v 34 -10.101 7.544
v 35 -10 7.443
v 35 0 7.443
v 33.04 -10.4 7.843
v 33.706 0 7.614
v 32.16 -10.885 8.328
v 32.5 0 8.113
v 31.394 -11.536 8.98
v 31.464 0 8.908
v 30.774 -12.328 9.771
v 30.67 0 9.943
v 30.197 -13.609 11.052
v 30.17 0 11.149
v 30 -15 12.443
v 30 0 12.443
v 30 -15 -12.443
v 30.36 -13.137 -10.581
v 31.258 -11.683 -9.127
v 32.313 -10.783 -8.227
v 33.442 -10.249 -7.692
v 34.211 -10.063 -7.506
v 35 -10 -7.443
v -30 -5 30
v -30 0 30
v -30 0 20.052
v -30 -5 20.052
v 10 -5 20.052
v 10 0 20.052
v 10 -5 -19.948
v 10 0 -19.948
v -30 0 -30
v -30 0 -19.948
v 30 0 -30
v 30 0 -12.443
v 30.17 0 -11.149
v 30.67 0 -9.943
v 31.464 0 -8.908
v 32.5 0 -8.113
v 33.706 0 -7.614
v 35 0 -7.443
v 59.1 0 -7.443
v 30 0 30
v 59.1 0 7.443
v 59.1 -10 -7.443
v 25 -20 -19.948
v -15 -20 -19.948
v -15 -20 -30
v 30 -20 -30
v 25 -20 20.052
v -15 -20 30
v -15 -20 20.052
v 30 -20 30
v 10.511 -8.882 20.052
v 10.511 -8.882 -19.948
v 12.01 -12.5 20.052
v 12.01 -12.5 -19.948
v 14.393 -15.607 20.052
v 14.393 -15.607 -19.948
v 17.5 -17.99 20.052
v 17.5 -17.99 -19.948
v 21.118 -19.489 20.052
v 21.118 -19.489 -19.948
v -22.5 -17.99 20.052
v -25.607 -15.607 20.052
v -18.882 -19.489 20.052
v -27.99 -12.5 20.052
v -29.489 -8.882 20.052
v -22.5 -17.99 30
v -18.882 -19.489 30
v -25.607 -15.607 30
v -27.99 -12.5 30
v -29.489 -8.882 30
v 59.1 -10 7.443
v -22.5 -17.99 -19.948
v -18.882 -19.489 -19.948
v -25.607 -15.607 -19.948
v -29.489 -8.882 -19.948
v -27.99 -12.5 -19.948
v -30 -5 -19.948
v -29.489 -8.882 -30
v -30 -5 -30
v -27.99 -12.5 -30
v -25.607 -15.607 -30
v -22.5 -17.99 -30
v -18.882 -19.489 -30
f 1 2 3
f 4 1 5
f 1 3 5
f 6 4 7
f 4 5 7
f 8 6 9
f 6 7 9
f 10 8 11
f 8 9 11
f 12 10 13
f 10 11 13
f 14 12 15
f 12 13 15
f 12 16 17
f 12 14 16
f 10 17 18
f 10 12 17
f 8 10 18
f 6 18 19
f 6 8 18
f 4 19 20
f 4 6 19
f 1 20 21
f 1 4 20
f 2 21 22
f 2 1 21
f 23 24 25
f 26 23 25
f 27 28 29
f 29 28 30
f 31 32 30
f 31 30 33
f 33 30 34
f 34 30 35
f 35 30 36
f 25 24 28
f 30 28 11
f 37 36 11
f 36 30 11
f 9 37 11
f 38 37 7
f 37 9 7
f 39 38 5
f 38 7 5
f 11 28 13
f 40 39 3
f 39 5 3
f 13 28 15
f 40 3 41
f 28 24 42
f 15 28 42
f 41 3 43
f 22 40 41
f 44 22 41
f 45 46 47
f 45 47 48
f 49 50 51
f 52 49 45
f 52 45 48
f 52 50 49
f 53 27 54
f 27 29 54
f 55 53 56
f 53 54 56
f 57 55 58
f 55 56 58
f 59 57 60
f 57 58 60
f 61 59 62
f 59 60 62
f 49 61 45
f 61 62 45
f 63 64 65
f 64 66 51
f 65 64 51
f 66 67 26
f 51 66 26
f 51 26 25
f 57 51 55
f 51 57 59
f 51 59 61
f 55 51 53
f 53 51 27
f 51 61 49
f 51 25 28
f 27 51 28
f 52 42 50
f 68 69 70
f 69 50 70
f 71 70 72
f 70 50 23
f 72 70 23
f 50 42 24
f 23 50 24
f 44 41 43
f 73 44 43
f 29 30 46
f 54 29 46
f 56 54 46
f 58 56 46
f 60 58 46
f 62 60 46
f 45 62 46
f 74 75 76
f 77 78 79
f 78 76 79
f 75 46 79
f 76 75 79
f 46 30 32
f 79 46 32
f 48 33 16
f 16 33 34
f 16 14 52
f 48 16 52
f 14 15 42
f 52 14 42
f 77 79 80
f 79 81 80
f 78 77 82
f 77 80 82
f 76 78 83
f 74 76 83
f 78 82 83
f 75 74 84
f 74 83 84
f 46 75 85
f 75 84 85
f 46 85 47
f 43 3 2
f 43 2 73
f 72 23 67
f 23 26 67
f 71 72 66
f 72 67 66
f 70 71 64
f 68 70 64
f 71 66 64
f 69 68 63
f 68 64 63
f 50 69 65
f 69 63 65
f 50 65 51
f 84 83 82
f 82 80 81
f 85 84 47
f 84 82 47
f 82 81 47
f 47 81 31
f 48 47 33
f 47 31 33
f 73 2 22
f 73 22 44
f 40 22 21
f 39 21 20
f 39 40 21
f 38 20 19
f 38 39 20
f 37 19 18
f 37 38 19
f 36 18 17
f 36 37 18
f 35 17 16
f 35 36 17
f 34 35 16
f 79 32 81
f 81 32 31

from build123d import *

# Parameters (mm, degrees)
F1_DEPTH = 20
F2_R     = 15
F3_W     = 30.964084
F3_H     = 14.88658
F4_DEPTH = 10
F5_R     = 5


with BuildPart() as f1:
    # F0 (on Front) → F1 (new body)
    with BuildSketch(Plane.XZ):
        Polygon((30, 30), (-30, 30), (-30, 20.051985), (10, 20.051985), (10, -19.948015), (-30, -19.948015), (-30, -30), (30, -30), align=None)
    extrude(amount=F1_DEPTH)

    # F2
    f2_edges = [f1.edges().sort_by_distance(p)[0] for p in [
        (10, -20, 0.051985),
        (-30, -20, -24.974007),
        (-30, -20, 25.025993),
    ]]
    fillet(f2_edges, radius=F2_R)

    # F3 (on Front) → F4 (join)
    with BuildSketch(Plane.XZ):
        with Locations((43.617677, 0)):
            Rectangle(F3_W, F3_H)
    extrude(amount=F4_DEPTH)

    # F5
    f5_edges = [f1.edges().sort_by_distance(p)[0] for p in [
        (30, -5, 7.44329),
        (30, -10, 0),
        (30, -5, -7.44329),
    ]]
    fillet(f5_edges, radius=F5_R)


solid = f1.part
